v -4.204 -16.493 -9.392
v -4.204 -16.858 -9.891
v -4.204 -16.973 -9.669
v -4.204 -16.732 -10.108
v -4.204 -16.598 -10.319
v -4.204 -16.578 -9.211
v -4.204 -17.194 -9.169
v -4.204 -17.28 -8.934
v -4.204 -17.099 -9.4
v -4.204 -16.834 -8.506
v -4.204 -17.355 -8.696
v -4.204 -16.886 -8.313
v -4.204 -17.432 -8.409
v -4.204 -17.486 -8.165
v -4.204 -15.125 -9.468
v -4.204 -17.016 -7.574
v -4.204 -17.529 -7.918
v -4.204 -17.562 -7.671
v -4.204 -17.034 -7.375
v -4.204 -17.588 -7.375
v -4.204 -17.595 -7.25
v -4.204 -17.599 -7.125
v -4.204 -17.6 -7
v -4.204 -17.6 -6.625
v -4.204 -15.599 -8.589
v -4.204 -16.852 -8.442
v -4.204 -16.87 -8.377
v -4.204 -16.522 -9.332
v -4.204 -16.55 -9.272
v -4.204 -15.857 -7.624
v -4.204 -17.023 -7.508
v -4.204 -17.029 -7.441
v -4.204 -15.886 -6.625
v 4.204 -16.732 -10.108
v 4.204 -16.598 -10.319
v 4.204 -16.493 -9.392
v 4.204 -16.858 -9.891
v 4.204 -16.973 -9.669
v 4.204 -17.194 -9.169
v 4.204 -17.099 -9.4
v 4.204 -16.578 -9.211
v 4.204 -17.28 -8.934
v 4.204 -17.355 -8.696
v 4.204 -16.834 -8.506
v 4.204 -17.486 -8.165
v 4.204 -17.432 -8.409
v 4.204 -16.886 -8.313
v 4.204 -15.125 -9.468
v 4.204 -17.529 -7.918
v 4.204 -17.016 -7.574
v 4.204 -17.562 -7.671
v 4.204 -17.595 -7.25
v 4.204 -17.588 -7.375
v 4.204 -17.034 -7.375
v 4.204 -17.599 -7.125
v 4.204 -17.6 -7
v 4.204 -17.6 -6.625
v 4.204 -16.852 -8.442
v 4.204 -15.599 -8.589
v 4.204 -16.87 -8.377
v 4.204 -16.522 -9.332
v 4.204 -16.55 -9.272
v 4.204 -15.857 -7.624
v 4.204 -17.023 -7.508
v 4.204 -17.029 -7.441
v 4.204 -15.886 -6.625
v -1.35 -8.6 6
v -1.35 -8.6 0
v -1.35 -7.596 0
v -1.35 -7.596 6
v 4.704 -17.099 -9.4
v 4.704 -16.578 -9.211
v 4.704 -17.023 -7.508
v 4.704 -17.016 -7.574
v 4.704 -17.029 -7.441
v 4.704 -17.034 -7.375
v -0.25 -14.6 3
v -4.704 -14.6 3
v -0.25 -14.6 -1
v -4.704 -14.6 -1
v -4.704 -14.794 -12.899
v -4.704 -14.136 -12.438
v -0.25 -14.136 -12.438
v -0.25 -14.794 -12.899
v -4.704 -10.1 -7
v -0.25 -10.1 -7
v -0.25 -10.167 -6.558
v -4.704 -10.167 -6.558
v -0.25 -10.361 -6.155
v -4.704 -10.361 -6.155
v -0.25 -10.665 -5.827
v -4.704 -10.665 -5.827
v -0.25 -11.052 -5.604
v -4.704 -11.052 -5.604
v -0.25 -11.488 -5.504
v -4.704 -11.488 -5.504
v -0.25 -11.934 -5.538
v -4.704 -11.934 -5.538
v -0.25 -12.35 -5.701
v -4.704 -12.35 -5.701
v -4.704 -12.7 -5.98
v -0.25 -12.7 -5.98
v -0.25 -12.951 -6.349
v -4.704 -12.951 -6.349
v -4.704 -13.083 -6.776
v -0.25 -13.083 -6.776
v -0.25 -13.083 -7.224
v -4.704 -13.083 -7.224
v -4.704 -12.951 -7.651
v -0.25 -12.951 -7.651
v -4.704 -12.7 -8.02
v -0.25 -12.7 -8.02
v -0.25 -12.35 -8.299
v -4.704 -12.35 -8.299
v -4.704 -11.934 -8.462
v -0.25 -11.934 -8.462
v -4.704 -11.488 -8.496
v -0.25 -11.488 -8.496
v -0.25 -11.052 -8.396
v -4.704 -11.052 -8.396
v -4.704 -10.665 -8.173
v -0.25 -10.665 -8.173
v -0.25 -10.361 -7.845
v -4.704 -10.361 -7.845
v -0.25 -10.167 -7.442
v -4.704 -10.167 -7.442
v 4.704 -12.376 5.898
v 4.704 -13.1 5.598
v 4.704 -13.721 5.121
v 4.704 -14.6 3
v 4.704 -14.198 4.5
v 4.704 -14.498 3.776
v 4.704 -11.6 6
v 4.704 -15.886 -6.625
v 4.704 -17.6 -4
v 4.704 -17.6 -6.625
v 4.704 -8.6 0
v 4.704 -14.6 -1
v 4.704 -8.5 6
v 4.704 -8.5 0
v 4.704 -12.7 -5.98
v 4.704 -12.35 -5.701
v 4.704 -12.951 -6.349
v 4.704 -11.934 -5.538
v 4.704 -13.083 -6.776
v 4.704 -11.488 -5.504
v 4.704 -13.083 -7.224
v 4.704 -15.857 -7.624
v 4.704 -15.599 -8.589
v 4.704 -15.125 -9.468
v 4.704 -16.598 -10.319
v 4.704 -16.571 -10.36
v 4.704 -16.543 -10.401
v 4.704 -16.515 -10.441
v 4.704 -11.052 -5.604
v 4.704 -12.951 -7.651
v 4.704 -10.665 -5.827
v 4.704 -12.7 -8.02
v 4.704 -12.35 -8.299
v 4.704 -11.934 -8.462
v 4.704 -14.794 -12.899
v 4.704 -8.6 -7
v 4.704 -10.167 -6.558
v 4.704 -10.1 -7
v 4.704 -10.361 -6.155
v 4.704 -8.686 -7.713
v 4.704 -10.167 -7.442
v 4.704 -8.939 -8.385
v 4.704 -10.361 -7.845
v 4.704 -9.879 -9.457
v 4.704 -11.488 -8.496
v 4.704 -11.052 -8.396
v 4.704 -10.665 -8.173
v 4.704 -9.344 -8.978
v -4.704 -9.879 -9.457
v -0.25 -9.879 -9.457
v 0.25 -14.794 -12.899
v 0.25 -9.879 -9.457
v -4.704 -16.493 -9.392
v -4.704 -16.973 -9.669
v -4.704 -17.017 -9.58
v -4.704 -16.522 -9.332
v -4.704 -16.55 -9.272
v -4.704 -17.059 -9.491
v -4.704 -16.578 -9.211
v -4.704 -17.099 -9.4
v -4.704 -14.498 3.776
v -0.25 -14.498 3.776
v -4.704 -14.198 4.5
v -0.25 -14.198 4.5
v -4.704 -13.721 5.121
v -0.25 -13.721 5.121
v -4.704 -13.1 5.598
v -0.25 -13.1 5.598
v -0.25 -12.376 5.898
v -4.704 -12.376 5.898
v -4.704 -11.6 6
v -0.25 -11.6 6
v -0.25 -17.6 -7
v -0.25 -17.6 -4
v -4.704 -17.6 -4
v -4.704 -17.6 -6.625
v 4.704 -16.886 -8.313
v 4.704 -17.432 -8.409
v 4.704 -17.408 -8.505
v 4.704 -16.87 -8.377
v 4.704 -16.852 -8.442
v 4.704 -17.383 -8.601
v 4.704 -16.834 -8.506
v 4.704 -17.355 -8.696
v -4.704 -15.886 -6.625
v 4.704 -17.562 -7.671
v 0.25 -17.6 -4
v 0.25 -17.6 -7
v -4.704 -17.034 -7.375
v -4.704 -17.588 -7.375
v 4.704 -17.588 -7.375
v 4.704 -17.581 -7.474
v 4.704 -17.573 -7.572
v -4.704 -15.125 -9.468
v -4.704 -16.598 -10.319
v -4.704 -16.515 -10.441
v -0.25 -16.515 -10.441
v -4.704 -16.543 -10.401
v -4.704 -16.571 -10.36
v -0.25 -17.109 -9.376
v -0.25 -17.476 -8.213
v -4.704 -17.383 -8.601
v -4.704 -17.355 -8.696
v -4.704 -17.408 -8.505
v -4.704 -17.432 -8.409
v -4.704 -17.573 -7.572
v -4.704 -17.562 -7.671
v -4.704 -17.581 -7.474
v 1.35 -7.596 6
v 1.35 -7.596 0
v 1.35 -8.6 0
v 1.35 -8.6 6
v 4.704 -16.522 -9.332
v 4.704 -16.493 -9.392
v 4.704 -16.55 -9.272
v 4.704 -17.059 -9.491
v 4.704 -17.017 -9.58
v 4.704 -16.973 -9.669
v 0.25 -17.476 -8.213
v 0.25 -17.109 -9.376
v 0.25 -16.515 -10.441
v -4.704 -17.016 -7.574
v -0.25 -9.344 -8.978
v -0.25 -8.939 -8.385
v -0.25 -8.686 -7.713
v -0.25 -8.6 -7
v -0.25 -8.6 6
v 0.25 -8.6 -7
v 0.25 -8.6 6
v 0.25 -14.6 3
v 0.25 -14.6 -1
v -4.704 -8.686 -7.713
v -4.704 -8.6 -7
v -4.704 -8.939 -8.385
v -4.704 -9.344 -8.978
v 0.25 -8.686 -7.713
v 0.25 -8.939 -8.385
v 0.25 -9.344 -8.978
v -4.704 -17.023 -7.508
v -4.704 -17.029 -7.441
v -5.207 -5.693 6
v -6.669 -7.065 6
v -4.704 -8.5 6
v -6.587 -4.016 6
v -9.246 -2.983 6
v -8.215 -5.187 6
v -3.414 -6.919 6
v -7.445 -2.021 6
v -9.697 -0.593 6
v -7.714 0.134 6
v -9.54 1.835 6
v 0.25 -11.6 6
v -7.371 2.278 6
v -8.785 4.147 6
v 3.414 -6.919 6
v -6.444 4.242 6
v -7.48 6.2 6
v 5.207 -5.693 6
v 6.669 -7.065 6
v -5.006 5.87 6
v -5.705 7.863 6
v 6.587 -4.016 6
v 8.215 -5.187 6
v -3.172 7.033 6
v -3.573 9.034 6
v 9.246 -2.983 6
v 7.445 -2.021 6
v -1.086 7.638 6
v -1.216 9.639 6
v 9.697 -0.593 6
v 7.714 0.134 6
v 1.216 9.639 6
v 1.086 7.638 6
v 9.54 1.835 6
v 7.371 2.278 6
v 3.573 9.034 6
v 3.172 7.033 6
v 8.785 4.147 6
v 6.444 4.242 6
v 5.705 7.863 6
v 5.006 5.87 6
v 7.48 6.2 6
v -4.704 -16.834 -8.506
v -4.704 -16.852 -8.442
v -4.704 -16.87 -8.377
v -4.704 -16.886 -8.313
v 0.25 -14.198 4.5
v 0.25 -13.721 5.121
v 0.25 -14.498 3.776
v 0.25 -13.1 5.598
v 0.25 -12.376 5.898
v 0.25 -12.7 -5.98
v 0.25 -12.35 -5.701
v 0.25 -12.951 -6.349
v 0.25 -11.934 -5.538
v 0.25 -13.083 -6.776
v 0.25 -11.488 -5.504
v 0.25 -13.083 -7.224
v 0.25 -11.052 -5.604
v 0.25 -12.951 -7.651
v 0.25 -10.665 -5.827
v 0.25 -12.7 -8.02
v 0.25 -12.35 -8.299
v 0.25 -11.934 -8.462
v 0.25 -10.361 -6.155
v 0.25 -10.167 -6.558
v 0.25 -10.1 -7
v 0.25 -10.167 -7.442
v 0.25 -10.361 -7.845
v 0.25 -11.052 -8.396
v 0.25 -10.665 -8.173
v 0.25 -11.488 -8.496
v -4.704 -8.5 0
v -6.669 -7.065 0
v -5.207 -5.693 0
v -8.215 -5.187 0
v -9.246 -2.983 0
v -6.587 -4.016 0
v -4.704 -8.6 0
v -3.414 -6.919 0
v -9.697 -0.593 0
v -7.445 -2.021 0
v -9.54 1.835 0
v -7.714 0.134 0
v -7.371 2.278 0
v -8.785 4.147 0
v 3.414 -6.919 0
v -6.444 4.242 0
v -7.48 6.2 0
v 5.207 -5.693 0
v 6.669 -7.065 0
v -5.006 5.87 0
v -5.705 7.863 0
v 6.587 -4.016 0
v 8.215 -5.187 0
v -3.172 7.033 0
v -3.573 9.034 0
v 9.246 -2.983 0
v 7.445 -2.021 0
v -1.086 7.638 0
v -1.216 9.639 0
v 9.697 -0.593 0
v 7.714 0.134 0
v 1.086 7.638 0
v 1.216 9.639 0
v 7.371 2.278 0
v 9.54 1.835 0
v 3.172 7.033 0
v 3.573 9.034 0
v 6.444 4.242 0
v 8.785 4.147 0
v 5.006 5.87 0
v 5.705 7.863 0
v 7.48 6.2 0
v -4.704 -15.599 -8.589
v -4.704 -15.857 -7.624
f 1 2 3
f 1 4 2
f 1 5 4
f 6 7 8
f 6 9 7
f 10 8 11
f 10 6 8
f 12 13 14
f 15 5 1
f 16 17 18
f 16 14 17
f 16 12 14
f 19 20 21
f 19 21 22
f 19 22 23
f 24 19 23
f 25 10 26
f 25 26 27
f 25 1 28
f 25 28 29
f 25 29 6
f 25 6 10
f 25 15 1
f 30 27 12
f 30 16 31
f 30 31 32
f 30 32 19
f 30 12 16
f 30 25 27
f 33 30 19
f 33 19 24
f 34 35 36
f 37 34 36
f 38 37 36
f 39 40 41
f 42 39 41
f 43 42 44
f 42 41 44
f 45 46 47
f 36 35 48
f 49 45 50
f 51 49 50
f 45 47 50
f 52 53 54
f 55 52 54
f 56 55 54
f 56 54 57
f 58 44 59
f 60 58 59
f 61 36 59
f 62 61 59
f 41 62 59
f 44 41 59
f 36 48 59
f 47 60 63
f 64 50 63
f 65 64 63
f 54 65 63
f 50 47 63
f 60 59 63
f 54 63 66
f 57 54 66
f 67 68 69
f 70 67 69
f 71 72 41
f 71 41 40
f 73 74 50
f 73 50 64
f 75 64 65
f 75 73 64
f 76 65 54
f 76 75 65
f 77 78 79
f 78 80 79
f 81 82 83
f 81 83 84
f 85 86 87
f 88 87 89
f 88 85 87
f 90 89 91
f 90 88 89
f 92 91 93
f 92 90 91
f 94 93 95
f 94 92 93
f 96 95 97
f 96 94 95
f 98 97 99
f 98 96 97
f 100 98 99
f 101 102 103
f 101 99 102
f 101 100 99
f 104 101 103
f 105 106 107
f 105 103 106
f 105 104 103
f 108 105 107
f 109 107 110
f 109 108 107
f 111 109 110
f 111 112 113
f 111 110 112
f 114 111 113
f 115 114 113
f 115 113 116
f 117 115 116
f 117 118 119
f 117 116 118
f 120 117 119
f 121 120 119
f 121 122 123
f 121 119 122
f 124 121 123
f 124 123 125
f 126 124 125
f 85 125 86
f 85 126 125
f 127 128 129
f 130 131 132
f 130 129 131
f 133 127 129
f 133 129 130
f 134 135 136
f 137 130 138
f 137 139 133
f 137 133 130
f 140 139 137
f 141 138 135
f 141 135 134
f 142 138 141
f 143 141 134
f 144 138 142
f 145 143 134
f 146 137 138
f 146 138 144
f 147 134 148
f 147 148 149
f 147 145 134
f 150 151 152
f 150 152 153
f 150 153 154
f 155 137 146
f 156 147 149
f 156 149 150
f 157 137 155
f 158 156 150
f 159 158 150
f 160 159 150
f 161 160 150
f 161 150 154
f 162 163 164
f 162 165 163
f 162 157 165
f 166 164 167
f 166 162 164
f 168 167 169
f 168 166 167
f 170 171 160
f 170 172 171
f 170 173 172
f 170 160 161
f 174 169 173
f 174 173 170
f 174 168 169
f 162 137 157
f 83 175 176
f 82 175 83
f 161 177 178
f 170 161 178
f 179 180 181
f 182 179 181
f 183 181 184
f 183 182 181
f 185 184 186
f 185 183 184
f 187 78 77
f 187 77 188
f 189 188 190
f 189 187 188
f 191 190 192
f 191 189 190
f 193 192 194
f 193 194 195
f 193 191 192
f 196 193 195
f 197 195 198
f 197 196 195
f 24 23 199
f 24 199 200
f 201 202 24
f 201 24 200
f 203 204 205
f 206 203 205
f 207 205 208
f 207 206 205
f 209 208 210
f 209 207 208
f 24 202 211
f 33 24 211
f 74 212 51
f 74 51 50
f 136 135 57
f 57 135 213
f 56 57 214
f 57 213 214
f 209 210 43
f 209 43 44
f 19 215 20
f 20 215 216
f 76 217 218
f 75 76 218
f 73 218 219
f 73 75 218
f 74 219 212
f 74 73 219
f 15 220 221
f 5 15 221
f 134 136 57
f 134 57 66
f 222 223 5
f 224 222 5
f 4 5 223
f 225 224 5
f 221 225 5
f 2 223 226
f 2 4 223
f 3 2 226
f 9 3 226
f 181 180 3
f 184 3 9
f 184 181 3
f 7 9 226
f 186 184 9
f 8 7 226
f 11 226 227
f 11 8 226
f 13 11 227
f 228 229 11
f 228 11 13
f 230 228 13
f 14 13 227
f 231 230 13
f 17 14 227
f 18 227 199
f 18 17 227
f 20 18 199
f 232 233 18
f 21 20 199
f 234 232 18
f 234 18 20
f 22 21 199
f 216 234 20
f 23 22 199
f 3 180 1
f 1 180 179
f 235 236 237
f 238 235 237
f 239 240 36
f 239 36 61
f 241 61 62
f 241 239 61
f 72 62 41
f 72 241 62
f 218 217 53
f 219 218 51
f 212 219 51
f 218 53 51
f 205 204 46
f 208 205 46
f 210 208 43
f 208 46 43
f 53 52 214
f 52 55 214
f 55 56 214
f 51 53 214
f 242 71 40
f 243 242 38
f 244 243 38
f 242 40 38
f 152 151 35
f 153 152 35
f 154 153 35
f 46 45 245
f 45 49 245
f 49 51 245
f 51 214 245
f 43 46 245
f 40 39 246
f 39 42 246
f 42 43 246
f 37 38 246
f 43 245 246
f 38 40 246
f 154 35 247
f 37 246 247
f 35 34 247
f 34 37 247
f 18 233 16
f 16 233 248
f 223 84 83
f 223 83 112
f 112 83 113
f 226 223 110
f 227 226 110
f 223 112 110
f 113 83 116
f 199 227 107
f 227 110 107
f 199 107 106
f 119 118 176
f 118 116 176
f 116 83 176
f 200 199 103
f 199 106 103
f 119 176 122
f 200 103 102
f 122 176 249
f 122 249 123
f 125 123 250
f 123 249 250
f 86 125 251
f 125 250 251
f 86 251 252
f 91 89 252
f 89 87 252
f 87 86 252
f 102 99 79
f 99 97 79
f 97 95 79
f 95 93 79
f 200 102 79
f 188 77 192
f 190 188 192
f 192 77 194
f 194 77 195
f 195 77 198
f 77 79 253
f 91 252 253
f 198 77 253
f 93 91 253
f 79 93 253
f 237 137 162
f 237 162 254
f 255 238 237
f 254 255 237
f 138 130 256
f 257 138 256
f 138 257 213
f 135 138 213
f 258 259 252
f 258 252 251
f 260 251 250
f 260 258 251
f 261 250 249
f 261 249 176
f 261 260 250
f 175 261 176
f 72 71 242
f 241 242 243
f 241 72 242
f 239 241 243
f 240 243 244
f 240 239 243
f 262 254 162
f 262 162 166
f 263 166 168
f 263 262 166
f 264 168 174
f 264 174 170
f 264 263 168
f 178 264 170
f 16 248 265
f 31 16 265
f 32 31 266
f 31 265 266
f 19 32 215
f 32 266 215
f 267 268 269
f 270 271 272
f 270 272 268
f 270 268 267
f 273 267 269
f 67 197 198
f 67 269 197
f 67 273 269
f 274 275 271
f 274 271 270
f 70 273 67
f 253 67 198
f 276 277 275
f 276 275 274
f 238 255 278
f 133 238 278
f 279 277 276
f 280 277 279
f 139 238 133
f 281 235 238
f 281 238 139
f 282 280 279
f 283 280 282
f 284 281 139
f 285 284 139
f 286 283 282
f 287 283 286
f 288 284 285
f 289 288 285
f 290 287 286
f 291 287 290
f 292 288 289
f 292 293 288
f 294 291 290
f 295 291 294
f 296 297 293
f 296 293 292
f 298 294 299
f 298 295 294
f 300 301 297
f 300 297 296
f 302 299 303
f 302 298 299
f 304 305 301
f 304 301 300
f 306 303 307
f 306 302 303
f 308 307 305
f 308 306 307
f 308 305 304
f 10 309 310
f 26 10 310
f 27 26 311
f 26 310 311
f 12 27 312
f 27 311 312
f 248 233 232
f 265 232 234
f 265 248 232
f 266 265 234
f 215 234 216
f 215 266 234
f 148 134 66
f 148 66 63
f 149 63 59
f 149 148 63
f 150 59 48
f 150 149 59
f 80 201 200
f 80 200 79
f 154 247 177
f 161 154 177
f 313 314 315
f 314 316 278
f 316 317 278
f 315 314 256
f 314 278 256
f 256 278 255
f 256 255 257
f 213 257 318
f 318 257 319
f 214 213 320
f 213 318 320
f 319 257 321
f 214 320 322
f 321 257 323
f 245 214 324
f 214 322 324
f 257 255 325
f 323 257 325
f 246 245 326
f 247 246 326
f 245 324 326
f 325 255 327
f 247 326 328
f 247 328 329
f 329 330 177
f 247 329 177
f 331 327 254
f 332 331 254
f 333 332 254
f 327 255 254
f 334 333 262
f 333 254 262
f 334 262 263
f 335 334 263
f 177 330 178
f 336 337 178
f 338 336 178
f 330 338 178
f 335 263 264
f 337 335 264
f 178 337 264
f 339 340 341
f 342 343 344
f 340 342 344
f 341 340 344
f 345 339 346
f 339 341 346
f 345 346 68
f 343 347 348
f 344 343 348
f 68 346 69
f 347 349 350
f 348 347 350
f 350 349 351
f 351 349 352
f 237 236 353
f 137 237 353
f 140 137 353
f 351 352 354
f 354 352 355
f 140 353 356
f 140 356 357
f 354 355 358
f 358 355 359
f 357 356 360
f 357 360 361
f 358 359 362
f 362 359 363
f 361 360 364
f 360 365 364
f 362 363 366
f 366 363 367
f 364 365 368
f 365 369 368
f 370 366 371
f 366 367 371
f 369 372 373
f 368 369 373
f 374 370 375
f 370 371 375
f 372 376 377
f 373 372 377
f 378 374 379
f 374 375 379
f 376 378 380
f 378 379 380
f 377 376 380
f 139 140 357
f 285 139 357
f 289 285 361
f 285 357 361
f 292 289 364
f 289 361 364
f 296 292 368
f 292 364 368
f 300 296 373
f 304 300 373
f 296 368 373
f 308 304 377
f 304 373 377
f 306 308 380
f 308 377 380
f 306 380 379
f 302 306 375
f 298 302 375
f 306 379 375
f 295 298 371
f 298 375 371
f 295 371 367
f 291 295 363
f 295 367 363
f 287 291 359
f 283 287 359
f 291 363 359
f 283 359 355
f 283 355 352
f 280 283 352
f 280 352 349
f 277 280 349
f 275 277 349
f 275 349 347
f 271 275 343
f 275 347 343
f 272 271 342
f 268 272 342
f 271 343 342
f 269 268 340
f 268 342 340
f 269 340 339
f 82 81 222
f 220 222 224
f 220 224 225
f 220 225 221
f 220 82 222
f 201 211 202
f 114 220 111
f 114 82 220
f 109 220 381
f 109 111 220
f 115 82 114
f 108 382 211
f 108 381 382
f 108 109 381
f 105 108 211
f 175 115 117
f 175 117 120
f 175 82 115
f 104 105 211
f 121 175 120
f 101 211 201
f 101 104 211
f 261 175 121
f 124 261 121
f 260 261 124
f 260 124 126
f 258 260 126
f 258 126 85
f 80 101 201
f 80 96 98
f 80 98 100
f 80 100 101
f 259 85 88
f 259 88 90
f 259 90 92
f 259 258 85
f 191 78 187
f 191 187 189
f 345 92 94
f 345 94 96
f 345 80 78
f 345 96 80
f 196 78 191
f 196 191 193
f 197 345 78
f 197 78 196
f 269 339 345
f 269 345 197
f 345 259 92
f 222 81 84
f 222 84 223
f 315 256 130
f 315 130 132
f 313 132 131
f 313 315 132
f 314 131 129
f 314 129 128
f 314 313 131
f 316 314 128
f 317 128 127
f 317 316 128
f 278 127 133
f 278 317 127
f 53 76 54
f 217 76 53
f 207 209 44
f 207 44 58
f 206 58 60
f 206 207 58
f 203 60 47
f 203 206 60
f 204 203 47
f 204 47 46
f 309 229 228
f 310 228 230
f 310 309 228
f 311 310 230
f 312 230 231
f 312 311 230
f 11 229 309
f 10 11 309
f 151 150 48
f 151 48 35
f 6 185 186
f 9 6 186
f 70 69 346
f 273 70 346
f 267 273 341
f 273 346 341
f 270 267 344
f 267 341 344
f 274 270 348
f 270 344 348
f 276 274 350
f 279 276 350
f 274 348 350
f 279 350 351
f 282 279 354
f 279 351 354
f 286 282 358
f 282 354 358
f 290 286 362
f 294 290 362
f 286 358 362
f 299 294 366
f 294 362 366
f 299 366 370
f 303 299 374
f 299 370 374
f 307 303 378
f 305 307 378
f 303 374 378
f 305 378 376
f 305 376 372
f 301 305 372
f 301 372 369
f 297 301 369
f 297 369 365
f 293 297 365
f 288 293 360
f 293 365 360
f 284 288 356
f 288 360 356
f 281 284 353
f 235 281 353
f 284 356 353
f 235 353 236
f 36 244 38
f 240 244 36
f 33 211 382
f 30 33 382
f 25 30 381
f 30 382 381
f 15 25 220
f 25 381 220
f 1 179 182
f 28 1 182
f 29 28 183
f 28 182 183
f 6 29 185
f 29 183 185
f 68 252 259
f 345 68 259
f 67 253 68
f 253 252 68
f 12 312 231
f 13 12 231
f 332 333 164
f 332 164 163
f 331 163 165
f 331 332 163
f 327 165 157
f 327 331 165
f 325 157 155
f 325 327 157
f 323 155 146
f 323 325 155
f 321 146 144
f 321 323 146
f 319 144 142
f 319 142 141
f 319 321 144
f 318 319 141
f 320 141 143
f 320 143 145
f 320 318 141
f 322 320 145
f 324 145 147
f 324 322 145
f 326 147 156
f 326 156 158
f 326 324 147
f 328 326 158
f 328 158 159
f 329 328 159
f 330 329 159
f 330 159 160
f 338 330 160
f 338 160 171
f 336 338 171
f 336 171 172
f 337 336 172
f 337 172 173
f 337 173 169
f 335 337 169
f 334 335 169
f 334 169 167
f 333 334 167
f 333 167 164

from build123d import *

# Parameters (mm, degrees)
SHAPE_DEPTH       = 6
SKETCH3_W         = 4.454383594
SKETCH3_H         = 6
LEVER_DEPTH       = 10
CUTS_START        = -9.408767
SKETCH2_R         = 1.5
CUTS_DEPTH        = 9.408767
LIMITS_1_DEPTH    = 4.454383594
LIMITS_START      = -4.454383594
LIMITS_2_DEPTH    = 4.454383594
ANGLE_FIX_1_DEPTH = 0.5


with BuildPart() as part:
    # Sketch1 → Shape (new body)
    with BuildSketch(Plane.XY):
        with BuildLine():
            Line((1.35, -7.59596768), (1.35, -8.6))
            Line((1.35, -8.6), (0.25, -8.6))
            Line((0.25, -8.6), (0.25, -14.6))
            Line((0.25, -14.6), (4.704383594, -14.6))
            Line((4.704383594, -14.6), (4.704383594, -8.5))
            ThreePointArc((4.704383594, -8.5), (0, 9.715), (-4.704383594, -8.5))
            Line((-4.704383594, -8.5), (-4.704383594, -14.6))
            Line((-4.704383594, -14.6), (-0.25, -14.6))
            Line((-0.25, -14.6), (-0.25, -8.6))
            Line((-0.25, -8.6), (-1.35, -8.6))
            Line((-1.35, -8.6), (-1.35, -7.59596768))
            ThreePointArc((-1.35, -7.59596768), (0, 7.715), (1.35, -7.59596768))
        make_face()
    extrude(amount=SHAPE_DEPTH)

    # Sketch3 → Lever (add)
    with BuildSketch(Plane(origin=(0, 0, 0), x_dir=(-1, 0, 0), z_dir=(0, 0, -1))):
        with Locations((-2.477191797, -11.6)):
            Rectangle(SKETCH3_W, SKETCH3_H)
        with Locations((2.477191797, -11.6)):
            Rectangle(SKETCH3_W, SKETCH3_H)
    extrude(amount=LEVER_DEPTH)

    # Sketch2 → Cuts (cut)
    with BuildSketch(Plane(origin=(4.704383594, 0, 0), x_dir=(0, 0, -1), z_dir=(1, 0, 0)).offset(CUTS_START)):
        with BuildLine():
            ThreePointArc((-3, -14.6), (-5.121320344, -13.721320344), (-6, -11.6))
            Line((-6, -11.6), (-6, -14.6))
            Line((-6, -14.6), (-3, -14.6))
        make_face()
        with BuildLine():
            Line((10, -8.6), (7, -8.6))
            ThreePointArc((7, -8.6), (9.121320344, -9.478679656), (10, -11.6))
            Line((10, -11.6), (10, -8.6))
        make_face()
        with BuildLine():
            ThreePointArc((10, -11.6), (9.121320344, -13.721320344), (7, -14.6))
            Line((7, -14.6), (10, -14.6))
            Line((10, -14.6), (10, -11.6))
        make_face()
        with Locations(Location((7, -11.6, 0), (0, 0, 90))):
            Circle(SKETCH2_R)
    extrude(amount=CUTS_DEPTH, mode=Mode.SUBTRACT)

    # Sketch5 → Limits 1 (add)
    with BuildSketch(Plane.ZY.offset(4.704383594)):
        with BuildLine():
            ThreePointArc((-4, -16.796152423), (-5.447085729, -17.395554958), (-7, -17.6))
            Line((-7, -17.6), (-4, -17.6))
            Line((-4, -17.6), (-4, -16.796152423))
        make_face()
        with BuildLine():
            Line((-7, -14.6), (-7, -17.6))
            ThreePointArc((-7, -17.6), (-5.447085729, -17.395554958), (-4, -16.796152423))
            Line((-4, -16.796152423), (-4, -14.6))
            Line((-4, -14.6), (-7, -14.6))
        make_face()
        with BuildLine():
            ThreePointArc((-12.437846722, -14.13570957), (-11.596266659, -15.456725658), (-10.441458618, -16.514912266))
            Line((-10.441458618, -16.514912266), (-8.720729309, -14.057456133))
            ThreePointArc((-8.720729309, -14.057456133), (-9.954423259, -12.120944533), (-9.457456133, -9.879270691))
            Line((-9.457456133, -9.879270691), (-12.437846722, -14.13570957))
        make_face()
        with BuildLine():
            Line((-12.898914751, -14.794182957), (-10.441458618, -16.514912266))
            ThreePointArc((-10.441458618, -16.514912266), (-11.596266659, -15.456725658), (-12.437846722, -14.13570957))
            Line((-12.437846722, -14.13570957), (-12.898914751, -14.794182957))
        make_face()
        with BuildLine():
            ThreePointArc((-10.441458618, -16.514912266), (-8.804234797, -17.322301704), (-7, -17.6))
            Line((-7, -17.6), (-7, -14.6))
            ThreePointArc((-7, -14.6), (-7.902117399, -14.461150852), (-8.720729309, -14.057456133))
            Line((-8.720729309, -14.057456133), (-10.441458618, -16.514912266))
        make_face()
        with BuildLine():
            Line((-4, -16.796152423), (-4, -17.6))
            Line((-4, -17.6), (-1, -14.6))
            Line((-1, -14.6), (-1.803847577, -14.6))
            ThreePointArc((-1.803847577, -14.6), (-2.757359313, -15.842640687), (-4, -16.796152423))
        make_face()
        with BuildLine():
            Line((-4, -14.6), (-4, -16.796152423))
            ThreePointArc((-4, -16.796152423), (-2.757359313, -15.842640687), (-1.803847577, -14.6))
            Line((-1.803847577, -14.6), (-4, -14.6))
        make_face()
    extrude(amount=-LIMITS_1_DEPTH)

    # Sketch6 → Limits 2 (add)
    with BuildSketch(Plane(origin=(4.704383594, 0, 0), x_dir=(0, 0, -1), z_dir=(1, 0, 0)).offset(LIMITS_START)):
        with BuildLine():
            Line((7, -14.6), (1, -14.6))
            Line((1, -14.6), (4, -17.6))
            Line((4, -17.6), (7, -17.6))
            ThreePointArc((7, -17.6), (8.804234797, -17.322301704), (10.441458618, -16.514912266))
            Line((10.441458618, -16.514912266), (12.898914751, -14.794182957))
            Line((12.898914751, -14.794182957), (9.457456133, -9.879270691))
            ThreePointArc((9.457456133, -9.879270691), (9.6610325, -12.98524584), (7, -14.6))
        make_face()
    extrude(amount=LIMITS_2_DEPTH)

    # Sketch7 → Angle fix 1 (cut)
    with BuildSketch(Plane.ZY.offset(4.704383594)):
        with BuildLine():
            Line((-8.312844754, -16.885973656), (-8.411191973, -17.443728451))
            Line((-8.411191973, -17.443728451), (-7.672586159, -17.573964585))
            Line((-7.672586159, -17.573964585), (-7.57423894, -17.01620979))
            ThreePointArc((-7.57423894, -17.01620979), (-7.474699486, -17.025839957), (-7.375, -17.033640938))
            Line((-7.375, -17.033640938), (-7.375, -17.6))
            Line((-7.375, -17.6), (-6.625, -17.6))
            Line((-6.625, -17.6), (-6.625, -15.886269614))
            ThreePointArc((-6.625, -15.886269614), (-8.113605815, -15.75603348), (-9.467894333, -15.124518373))
            Line((-9.467894333, -15.124518373), (-10.324759526, -16.608652423))
            Line((-10.324759526, -16.608652423), (-9.675240474, -16.983652423))
            Line((-9.675240474, -16.983652423), (-9.392060943, -16.493171087))
            ThreePointArc((-9.392060943, -16.493171087), (-9.301818164, -16.536264983), (-9.210799385, -16.57769474))
            Line((-9.210799385, -16.57769474), (-9.404505593, -17.109898171))
            Line((-9.404505593, -17.109898171), (-8.699736127, -17.366413278))
            Line((-8.699736127, -17.366413278), (-8.50602992, -16.834209847))
            ThreePointArc((-8.50602992, -16.834209847), (-8.409674955, -16.860978556), (-8.312844754, -16.885973656))
        make_face()
    angle_fix_1 = extrude(amount=-ANGLE_FIX_1_DEPTH, mode=Mode.SUBTRACT)

    # Angle fix 2: Angle fix 1 across plane
    add(angle_fix_1.mirror(Plane(origin=(0, 0, 0), x_dir=(0, 0, 1), z_dir=(1, 0, 0))), mode=Mode.SUBTRACT)


solid = part.part
